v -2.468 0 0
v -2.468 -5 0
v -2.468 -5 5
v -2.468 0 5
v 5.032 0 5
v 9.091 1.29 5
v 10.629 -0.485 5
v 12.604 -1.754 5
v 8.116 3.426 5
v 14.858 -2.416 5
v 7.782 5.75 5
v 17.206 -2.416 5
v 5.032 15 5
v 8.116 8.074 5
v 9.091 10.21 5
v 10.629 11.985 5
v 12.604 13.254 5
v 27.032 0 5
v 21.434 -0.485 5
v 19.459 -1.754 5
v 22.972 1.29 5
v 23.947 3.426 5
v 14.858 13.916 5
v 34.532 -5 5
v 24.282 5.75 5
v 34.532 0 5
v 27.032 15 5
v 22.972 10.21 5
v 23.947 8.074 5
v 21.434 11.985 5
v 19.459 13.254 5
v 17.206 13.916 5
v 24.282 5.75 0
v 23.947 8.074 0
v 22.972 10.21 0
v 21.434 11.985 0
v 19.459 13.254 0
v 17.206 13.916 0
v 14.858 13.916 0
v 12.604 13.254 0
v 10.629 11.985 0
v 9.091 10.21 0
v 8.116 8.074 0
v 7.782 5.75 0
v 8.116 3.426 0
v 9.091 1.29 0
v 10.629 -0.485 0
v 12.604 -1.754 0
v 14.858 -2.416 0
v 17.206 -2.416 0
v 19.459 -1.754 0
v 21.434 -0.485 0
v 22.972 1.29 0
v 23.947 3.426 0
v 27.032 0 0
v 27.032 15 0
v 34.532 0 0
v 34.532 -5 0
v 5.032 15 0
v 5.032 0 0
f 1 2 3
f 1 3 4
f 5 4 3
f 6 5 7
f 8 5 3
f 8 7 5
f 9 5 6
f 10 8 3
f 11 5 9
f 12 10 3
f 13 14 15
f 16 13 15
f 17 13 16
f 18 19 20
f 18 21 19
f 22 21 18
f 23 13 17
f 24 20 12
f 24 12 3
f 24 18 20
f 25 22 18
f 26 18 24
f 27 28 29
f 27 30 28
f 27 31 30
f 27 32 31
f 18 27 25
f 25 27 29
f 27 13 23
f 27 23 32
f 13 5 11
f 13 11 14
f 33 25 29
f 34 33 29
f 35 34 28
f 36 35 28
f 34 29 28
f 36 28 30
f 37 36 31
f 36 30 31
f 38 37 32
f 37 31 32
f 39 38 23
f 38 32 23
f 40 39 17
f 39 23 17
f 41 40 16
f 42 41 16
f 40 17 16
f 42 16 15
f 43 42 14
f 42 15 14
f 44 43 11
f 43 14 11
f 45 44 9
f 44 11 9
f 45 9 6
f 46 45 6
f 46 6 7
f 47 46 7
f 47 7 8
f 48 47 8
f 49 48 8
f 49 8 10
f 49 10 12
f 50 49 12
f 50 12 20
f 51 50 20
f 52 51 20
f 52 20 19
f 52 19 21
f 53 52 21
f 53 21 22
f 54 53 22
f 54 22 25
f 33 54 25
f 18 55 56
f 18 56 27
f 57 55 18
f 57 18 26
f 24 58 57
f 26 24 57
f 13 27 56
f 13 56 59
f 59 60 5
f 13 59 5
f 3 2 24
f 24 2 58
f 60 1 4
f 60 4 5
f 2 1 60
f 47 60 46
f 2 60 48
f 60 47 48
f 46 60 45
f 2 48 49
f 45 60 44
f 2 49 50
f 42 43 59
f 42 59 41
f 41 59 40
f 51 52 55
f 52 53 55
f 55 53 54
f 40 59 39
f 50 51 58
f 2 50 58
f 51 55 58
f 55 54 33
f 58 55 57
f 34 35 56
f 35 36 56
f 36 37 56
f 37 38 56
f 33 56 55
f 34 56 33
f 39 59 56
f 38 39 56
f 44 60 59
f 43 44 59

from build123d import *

# Parameters (mm, degrees)
F0_W     = 37
F0_H     = 5
F1_DEPTH = 5
F2_W     = 22
F2_H     = 5
F3_DEPTH = 15
F4_R     = 8.25
F5_DEPTH = 25.4


with BuildPart() as f1:
    # F0 (on Top) → F1 (new body)
    with BuildSketch(Plane.XY):
        with Locations((16.031665, -2.5)):
            Rectangle(F0_W, F0_H)
    extrude(amount=F1_DEPTH)

    # F2 (on face) → F3 (join)
    with BuildSketch(Plane(origin=(0, 0, 0), x_dir=(-1, 0, 0), z_dir=(0, 1, 0))):
        with Locations((-16.031665, 2.5)):
            Rectangle(F2_W, F2_H)
    extrude(amount=F3_DEPTH)

    # F4 (on face) → F5 (cut)
    with BuildSketch(Plane.XY.offset(5)):
        with Locations((16.031665, 5.75)):
            Circle(F4_R)
    extrude(amount=-F5_DEPTH, mode=Mode.SUBTRACT)


solid = f1.part
